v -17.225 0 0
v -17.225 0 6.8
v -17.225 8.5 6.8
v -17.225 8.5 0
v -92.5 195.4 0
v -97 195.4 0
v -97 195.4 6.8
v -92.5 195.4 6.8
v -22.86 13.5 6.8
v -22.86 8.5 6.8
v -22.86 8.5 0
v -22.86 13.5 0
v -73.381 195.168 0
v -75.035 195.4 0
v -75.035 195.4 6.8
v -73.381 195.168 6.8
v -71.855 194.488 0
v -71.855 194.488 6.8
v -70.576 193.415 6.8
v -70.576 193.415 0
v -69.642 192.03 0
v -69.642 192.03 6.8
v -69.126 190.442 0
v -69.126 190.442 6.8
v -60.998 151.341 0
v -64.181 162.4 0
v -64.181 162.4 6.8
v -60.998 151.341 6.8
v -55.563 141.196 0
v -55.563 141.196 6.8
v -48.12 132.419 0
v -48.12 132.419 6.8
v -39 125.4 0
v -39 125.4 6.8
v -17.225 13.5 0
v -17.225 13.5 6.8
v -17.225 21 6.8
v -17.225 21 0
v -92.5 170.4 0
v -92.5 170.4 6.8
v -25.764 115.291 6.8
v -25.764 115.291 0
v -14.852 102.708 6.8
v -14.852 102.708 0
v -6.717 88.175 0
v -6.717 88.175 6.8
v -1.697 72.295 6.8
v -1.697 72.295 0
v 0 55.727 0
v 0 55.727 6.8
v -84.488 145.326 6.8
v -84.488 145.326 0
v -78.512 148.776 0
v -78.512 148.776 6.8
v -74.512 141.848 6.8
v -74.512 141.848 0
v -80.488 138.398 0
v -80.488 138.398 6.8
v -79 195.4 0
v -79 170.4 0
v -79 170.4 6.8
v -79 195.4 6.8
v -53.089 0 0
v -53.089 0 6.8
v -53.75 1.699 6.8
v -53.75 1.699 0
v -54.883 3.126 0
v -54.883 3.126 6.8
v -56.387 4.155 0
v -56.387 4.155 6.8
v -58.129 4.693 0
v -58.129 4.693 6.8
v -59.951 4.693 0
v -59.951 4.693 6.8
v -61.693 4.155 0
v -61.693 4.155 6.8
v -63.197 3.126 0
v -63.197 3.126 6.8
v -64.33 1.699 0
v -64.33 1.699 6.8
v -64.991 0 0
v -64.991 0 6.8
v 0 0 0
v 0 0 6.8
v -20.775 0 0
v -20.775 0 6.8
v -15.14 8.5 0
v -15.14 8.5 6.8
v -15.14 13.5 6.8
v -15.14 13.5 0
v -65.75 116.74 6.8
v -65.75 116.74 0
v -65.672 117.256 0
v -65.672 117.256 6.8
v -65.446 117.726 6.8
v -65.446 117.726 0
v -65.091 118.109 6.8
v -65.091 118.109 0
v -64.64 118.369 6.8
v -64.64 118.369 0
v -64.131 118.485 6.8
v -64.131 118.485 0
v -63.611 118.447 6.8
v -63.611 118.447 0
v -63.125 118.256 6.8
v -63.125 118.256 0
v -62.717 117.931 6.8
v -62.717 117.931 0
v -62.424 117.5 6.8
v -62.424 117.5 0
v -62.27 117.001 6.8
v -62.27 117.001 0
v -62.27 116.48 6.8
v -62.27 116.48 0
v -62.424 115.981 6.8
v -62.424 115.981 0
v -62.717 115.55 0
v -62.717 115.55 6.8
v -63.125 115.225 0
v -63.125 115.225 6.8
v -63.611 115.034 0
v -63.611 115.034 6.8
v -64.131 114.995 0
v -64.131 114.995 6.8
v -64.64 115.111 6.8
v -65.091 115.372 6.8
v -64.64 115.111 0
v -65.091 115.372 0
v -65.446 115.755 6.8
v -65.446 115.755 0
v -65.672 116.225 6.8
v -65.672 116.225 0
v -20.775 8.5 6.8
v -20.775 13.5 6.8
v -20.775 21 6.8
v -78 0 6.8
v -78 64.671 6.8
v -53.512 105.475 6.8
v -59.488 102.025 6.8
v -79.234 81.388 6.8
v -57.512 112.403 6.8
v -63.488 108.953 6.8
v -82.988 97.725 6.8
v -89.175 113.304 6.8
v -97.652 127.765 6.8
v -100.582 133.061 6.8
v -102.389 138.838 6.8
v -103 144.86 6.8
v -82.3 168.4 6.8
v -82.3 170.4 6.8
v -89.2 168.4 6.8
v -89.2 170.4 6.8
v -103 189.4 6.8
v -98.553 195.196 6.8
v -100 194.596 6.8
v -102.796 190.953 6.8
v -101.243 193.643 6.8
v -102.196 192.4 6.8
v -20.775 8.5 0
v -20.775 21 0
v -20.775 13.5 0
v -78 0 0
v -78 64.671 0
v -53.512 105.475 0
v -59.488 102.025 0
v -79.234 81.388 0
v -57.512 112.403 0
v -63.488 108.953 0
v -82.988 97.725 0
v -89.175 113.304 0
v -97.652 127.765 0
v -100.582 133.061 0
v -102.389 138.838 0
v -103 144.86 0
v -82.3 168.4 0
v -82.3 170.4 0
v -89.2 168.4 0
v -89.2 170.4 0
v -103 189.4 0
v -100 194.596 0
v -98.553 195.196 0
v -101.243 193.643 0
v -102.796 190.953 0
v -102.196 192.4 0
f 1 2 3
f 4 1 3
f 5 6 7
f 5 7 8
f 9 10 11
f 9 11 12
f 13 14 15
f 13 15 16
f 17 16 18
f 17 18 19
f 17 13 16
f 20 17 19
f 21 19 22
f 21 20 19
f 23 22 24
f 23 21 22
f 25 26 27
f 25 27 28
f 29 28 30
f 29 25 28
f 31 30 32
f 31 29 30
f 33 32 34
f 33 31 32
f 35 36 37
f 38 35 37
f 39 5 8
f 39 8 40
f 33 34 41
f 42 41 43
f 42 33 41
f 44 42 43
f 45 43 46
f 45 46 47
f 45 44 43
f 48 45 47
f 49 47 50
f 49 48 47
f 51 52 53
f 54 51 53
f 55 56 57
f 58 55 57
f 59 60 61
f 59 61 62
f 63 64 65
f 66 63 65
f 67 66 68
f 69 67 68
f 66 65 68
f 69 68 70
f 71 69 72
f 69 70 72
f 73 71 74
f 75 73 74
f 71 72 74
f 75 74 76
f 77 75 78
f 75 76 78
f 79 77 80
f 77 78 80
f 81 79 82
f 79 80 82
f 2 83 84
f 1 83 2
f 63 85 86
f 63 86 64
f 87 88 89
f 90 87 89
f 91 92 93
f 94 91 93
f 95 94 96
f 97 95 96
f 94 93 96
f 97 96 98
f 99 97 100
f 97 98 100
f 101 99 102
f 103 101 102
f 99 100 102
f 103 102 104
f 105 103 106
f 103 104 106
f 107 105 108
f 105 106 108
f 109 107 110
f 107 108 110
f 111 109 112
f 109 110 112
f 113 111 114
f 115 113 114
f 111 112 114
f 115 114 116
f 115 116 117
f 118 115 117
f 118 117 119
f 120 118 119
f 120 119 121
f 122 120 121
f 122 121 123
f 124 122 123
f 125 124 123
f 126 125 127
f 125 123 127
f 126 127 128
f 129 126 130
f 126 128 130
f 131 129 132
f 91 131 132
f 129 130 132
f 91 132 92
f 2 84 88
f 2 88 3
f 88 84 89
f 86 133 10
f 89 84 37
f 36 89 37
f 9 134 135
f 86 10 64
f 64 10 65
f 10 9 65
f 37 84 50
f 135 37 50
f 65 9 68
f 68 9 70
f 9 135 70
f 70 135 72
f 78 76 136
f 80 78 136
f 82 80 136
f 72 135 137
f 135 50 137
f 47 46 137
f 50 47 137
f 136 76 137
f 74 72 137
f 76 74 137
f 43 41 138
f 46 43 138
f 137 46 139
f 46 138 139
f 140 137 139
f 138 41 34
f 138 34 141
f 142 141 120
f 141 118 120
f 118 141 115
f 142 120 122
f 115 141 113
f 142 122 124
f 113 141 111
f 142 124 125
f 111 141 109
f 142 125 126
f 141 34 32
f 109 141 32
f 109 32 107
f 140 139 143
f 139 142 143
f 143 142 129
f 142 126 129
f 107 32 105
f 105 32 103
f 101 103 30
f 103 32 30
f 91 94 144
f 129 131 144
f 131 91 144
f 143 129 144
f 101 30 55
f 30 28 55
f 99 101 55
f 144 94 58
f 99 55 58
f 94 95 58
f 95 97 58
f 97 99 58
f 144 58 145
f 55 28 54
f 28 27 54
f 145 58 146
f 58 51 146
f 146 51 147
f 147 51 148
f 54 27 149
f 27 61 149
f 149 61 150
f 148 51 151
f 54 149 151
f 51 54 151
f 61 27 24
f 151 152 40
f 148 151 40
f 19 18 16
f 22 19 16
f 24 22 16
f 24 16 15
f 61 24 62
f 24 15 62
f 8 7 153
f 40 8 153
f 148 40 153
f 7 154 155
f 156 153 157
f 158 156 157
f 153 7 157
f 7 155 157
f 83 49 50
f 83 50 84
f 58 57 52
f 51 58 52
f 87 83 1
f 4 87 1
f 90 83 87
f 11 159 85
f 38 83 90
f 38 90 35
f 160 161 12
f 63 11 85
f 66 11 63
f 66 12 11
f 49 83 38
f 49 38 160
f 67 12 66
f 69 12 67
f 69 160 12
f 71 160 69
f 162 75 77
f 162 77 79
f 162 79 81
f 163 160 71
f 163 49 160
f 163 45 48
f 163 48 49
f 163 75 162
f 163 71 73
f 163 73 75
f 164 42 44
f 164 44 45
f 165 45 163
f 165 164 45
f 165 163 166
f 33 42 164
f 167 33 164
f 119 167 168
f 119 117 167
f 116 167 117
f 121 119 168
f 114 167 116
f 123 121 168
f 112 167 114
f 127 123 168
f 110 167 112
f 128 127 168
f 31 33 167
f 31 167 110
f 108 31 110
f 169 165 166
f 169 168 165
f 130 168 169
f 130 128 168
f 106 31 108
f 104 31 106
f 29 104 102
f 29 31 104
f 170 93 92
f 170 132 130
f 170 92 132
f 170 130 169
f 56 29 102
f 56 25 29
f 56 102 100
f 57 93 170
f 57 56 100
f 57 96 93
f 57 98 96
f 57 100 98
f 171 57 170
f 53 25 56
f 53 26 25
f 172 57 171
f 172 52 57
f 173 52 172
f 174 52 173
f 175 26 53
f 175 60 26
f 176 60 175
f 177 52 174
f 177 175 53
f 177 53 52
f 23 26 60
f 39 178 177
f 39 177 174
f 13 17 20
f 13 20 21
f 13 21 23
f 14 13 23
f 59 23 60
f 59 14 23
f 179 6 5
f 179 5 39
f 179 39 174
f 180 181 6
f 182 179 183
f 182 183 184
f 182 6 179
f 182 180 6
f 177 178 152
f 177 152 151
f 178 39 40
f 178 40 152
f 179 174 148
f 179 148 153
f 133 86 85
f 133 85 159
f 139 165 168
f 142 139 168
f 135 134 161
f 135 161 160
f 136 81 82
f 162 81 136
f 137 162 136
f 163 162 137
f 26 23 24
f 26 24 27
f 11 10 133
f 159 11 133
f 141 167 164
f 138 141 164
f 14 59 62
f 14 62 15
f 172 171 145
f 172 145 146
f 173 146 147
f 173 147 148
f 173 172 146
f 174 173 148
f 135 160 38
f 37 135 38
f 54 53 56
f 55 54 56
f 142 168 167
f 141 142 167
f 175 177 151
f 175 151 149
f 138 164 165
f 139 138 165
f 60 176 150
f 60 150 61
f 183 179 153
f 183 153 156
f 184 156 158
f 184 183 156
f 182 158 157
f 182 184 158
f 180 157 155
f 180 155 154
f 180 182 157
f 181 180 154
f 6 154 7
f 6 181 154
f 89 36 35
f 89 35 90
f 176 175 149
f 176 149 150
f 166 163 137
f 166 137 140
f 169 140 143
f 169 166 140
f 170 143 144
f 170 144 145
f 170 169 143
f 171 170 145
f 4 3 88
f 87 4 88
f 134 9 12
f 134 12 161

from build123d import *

# Parameters (mm, degrees)
BOSS_EXTRUDE1_DEPTH = 6.8
SKETCH2_W           = 3.55
SKETCH2_H           = 7.5
SKETCH2_W_2         = 2.085
SKETCH2_H_2         = 5
SKETCH2_H_3         = 8.5
CUT_EXTRUDE1_DEPTH  = 6.8
SKETCH3_R           = 6.1
CUT_EXTRUDE2_DEPTH  = 6.8
SKETCH4_R           = 1.75
CUT_EXTRUDE3_DEPTH  = 6.8


with BuildPart() as part:
    # Sketch1 → Boss-Extrude1 (new body)
    with BuildSketch(Plane.XY):
        with BuildLine():
            Line((-97, 195.4), (-92.5, 195.4))
            Line((-92.5, 195.4), (-92.5, 170.4))
            Line((-92.5, 170.4), (-89.2, 170.4))
            Line((-89.2, 170.4), (-89.2, 168.4))
            Line((-89.2, 168.4), (-82.3, 168.4))
            Line((-82.3, 168.4), (-82.3, 170.4))
            Line((-82.3, 170.4), (-79, 170.4))
            Line((-79, 170.4), (-79, 195.4))
            Line((-79, 195.4), (-75.034597787, 195.4))
            ThreePointArc((-75.034597787, 195.4), (-71.177872129, 193.996266659), (-69.125751269, 190.441889066))
            Line((-69.125751269, 190.441889066), (-64.181209637, 162.4))
            ThreePointArc((-64.181209637, 162.4), (-55.56310459, 141.196422986), (-39, 125.4))
            ThreePointArc((-39, 125.4), (-10.413345727, 95.649656796), (0, 55.726706578))
            Line((0, 55.726706578), (0, 0))
            Line((0, 0), (-78, 0))
            Line((-78, 0), (-78, 64.670637847))
            ThreePointArc((-78, 64.670637847), (-82.987756652, 97.72473667), (-97.652405773, 127.764697248))
            ThreePointArc((-97.652405773, 127.764697248), (-101.631906793, 135.904056195), (-103, 144.860278245))
            Line((-103, 144.860278245), (-103, 189.4))
            ThreePointArc((-103, 189.4), (-101.242640687, 193.642640687), (-97, 195.4))
        make_face()
    extrude(amount=BOSS_EXTRUDE1_DEPTH)

    # Sketch2 → Cut-Extrude1 (cut)
    with BuildSketch(Plane.XY.offset(6.8)):
        with Locations((-19, 17.25)):
            Rectangle(SKETCH2_W, SKETCH2_H)
        with Locations((-21.8175, 11)):
            Rectangle(SKETCH2_W_2, SKETCH2_H_2)
        with Locations((-16.1825, 11)):
            Rectangle(SKETCH2_W_2, SKETCH2_H_2)
        with Locations((-19, 4.25)):
            Rectangle(SKETCH2_W, SKETCH2_H_3)
        with Locations((-19, 11)):
            Rectangle(SKETCH2_W, SKETCH2_H_2)
    extrude(amount=-CUT_EXTRUDE1_DEPTH, mode=Mode.SUBTRACT)

    # Sketch3 → Cut-Extrude2 (cut)
    with BuildSketch(Plane.XY.offset(6.8)):
        with Locations((-59.04, -1.33811552)):
            Circle(SKETCH3_R)
    extrude(amount=-CUT_EXTRUDE2_DEPTH, mode=Mode.SUBTRACT)

    # Sketch4 → Cut-Extrude3 (cut)
    with BuildSketch(Plane(origin=(0, 0, 0), x_dir=(-1, 0, 0), z_dir=(0, 0, -1))):
        with Locations((64.000212357, 116.740381057)):
            Circle(SKETCH4_R)
        Polygon((84.488, 145.326270189), (78.512424714, 148.776270189), (74.512424714, 141.848066959), (80.488, 138.398066959), align=None)
        Polygon((63.488, 108.95320323), (57.512424714, 112.40320323), (53.512424714, 105.475), (59.488, 102.025), align=None)
    extrude(amount=-CUT_EXTRUDE3_DEPTH, mode=Mode.SUBTRACT)


solid = part.part
